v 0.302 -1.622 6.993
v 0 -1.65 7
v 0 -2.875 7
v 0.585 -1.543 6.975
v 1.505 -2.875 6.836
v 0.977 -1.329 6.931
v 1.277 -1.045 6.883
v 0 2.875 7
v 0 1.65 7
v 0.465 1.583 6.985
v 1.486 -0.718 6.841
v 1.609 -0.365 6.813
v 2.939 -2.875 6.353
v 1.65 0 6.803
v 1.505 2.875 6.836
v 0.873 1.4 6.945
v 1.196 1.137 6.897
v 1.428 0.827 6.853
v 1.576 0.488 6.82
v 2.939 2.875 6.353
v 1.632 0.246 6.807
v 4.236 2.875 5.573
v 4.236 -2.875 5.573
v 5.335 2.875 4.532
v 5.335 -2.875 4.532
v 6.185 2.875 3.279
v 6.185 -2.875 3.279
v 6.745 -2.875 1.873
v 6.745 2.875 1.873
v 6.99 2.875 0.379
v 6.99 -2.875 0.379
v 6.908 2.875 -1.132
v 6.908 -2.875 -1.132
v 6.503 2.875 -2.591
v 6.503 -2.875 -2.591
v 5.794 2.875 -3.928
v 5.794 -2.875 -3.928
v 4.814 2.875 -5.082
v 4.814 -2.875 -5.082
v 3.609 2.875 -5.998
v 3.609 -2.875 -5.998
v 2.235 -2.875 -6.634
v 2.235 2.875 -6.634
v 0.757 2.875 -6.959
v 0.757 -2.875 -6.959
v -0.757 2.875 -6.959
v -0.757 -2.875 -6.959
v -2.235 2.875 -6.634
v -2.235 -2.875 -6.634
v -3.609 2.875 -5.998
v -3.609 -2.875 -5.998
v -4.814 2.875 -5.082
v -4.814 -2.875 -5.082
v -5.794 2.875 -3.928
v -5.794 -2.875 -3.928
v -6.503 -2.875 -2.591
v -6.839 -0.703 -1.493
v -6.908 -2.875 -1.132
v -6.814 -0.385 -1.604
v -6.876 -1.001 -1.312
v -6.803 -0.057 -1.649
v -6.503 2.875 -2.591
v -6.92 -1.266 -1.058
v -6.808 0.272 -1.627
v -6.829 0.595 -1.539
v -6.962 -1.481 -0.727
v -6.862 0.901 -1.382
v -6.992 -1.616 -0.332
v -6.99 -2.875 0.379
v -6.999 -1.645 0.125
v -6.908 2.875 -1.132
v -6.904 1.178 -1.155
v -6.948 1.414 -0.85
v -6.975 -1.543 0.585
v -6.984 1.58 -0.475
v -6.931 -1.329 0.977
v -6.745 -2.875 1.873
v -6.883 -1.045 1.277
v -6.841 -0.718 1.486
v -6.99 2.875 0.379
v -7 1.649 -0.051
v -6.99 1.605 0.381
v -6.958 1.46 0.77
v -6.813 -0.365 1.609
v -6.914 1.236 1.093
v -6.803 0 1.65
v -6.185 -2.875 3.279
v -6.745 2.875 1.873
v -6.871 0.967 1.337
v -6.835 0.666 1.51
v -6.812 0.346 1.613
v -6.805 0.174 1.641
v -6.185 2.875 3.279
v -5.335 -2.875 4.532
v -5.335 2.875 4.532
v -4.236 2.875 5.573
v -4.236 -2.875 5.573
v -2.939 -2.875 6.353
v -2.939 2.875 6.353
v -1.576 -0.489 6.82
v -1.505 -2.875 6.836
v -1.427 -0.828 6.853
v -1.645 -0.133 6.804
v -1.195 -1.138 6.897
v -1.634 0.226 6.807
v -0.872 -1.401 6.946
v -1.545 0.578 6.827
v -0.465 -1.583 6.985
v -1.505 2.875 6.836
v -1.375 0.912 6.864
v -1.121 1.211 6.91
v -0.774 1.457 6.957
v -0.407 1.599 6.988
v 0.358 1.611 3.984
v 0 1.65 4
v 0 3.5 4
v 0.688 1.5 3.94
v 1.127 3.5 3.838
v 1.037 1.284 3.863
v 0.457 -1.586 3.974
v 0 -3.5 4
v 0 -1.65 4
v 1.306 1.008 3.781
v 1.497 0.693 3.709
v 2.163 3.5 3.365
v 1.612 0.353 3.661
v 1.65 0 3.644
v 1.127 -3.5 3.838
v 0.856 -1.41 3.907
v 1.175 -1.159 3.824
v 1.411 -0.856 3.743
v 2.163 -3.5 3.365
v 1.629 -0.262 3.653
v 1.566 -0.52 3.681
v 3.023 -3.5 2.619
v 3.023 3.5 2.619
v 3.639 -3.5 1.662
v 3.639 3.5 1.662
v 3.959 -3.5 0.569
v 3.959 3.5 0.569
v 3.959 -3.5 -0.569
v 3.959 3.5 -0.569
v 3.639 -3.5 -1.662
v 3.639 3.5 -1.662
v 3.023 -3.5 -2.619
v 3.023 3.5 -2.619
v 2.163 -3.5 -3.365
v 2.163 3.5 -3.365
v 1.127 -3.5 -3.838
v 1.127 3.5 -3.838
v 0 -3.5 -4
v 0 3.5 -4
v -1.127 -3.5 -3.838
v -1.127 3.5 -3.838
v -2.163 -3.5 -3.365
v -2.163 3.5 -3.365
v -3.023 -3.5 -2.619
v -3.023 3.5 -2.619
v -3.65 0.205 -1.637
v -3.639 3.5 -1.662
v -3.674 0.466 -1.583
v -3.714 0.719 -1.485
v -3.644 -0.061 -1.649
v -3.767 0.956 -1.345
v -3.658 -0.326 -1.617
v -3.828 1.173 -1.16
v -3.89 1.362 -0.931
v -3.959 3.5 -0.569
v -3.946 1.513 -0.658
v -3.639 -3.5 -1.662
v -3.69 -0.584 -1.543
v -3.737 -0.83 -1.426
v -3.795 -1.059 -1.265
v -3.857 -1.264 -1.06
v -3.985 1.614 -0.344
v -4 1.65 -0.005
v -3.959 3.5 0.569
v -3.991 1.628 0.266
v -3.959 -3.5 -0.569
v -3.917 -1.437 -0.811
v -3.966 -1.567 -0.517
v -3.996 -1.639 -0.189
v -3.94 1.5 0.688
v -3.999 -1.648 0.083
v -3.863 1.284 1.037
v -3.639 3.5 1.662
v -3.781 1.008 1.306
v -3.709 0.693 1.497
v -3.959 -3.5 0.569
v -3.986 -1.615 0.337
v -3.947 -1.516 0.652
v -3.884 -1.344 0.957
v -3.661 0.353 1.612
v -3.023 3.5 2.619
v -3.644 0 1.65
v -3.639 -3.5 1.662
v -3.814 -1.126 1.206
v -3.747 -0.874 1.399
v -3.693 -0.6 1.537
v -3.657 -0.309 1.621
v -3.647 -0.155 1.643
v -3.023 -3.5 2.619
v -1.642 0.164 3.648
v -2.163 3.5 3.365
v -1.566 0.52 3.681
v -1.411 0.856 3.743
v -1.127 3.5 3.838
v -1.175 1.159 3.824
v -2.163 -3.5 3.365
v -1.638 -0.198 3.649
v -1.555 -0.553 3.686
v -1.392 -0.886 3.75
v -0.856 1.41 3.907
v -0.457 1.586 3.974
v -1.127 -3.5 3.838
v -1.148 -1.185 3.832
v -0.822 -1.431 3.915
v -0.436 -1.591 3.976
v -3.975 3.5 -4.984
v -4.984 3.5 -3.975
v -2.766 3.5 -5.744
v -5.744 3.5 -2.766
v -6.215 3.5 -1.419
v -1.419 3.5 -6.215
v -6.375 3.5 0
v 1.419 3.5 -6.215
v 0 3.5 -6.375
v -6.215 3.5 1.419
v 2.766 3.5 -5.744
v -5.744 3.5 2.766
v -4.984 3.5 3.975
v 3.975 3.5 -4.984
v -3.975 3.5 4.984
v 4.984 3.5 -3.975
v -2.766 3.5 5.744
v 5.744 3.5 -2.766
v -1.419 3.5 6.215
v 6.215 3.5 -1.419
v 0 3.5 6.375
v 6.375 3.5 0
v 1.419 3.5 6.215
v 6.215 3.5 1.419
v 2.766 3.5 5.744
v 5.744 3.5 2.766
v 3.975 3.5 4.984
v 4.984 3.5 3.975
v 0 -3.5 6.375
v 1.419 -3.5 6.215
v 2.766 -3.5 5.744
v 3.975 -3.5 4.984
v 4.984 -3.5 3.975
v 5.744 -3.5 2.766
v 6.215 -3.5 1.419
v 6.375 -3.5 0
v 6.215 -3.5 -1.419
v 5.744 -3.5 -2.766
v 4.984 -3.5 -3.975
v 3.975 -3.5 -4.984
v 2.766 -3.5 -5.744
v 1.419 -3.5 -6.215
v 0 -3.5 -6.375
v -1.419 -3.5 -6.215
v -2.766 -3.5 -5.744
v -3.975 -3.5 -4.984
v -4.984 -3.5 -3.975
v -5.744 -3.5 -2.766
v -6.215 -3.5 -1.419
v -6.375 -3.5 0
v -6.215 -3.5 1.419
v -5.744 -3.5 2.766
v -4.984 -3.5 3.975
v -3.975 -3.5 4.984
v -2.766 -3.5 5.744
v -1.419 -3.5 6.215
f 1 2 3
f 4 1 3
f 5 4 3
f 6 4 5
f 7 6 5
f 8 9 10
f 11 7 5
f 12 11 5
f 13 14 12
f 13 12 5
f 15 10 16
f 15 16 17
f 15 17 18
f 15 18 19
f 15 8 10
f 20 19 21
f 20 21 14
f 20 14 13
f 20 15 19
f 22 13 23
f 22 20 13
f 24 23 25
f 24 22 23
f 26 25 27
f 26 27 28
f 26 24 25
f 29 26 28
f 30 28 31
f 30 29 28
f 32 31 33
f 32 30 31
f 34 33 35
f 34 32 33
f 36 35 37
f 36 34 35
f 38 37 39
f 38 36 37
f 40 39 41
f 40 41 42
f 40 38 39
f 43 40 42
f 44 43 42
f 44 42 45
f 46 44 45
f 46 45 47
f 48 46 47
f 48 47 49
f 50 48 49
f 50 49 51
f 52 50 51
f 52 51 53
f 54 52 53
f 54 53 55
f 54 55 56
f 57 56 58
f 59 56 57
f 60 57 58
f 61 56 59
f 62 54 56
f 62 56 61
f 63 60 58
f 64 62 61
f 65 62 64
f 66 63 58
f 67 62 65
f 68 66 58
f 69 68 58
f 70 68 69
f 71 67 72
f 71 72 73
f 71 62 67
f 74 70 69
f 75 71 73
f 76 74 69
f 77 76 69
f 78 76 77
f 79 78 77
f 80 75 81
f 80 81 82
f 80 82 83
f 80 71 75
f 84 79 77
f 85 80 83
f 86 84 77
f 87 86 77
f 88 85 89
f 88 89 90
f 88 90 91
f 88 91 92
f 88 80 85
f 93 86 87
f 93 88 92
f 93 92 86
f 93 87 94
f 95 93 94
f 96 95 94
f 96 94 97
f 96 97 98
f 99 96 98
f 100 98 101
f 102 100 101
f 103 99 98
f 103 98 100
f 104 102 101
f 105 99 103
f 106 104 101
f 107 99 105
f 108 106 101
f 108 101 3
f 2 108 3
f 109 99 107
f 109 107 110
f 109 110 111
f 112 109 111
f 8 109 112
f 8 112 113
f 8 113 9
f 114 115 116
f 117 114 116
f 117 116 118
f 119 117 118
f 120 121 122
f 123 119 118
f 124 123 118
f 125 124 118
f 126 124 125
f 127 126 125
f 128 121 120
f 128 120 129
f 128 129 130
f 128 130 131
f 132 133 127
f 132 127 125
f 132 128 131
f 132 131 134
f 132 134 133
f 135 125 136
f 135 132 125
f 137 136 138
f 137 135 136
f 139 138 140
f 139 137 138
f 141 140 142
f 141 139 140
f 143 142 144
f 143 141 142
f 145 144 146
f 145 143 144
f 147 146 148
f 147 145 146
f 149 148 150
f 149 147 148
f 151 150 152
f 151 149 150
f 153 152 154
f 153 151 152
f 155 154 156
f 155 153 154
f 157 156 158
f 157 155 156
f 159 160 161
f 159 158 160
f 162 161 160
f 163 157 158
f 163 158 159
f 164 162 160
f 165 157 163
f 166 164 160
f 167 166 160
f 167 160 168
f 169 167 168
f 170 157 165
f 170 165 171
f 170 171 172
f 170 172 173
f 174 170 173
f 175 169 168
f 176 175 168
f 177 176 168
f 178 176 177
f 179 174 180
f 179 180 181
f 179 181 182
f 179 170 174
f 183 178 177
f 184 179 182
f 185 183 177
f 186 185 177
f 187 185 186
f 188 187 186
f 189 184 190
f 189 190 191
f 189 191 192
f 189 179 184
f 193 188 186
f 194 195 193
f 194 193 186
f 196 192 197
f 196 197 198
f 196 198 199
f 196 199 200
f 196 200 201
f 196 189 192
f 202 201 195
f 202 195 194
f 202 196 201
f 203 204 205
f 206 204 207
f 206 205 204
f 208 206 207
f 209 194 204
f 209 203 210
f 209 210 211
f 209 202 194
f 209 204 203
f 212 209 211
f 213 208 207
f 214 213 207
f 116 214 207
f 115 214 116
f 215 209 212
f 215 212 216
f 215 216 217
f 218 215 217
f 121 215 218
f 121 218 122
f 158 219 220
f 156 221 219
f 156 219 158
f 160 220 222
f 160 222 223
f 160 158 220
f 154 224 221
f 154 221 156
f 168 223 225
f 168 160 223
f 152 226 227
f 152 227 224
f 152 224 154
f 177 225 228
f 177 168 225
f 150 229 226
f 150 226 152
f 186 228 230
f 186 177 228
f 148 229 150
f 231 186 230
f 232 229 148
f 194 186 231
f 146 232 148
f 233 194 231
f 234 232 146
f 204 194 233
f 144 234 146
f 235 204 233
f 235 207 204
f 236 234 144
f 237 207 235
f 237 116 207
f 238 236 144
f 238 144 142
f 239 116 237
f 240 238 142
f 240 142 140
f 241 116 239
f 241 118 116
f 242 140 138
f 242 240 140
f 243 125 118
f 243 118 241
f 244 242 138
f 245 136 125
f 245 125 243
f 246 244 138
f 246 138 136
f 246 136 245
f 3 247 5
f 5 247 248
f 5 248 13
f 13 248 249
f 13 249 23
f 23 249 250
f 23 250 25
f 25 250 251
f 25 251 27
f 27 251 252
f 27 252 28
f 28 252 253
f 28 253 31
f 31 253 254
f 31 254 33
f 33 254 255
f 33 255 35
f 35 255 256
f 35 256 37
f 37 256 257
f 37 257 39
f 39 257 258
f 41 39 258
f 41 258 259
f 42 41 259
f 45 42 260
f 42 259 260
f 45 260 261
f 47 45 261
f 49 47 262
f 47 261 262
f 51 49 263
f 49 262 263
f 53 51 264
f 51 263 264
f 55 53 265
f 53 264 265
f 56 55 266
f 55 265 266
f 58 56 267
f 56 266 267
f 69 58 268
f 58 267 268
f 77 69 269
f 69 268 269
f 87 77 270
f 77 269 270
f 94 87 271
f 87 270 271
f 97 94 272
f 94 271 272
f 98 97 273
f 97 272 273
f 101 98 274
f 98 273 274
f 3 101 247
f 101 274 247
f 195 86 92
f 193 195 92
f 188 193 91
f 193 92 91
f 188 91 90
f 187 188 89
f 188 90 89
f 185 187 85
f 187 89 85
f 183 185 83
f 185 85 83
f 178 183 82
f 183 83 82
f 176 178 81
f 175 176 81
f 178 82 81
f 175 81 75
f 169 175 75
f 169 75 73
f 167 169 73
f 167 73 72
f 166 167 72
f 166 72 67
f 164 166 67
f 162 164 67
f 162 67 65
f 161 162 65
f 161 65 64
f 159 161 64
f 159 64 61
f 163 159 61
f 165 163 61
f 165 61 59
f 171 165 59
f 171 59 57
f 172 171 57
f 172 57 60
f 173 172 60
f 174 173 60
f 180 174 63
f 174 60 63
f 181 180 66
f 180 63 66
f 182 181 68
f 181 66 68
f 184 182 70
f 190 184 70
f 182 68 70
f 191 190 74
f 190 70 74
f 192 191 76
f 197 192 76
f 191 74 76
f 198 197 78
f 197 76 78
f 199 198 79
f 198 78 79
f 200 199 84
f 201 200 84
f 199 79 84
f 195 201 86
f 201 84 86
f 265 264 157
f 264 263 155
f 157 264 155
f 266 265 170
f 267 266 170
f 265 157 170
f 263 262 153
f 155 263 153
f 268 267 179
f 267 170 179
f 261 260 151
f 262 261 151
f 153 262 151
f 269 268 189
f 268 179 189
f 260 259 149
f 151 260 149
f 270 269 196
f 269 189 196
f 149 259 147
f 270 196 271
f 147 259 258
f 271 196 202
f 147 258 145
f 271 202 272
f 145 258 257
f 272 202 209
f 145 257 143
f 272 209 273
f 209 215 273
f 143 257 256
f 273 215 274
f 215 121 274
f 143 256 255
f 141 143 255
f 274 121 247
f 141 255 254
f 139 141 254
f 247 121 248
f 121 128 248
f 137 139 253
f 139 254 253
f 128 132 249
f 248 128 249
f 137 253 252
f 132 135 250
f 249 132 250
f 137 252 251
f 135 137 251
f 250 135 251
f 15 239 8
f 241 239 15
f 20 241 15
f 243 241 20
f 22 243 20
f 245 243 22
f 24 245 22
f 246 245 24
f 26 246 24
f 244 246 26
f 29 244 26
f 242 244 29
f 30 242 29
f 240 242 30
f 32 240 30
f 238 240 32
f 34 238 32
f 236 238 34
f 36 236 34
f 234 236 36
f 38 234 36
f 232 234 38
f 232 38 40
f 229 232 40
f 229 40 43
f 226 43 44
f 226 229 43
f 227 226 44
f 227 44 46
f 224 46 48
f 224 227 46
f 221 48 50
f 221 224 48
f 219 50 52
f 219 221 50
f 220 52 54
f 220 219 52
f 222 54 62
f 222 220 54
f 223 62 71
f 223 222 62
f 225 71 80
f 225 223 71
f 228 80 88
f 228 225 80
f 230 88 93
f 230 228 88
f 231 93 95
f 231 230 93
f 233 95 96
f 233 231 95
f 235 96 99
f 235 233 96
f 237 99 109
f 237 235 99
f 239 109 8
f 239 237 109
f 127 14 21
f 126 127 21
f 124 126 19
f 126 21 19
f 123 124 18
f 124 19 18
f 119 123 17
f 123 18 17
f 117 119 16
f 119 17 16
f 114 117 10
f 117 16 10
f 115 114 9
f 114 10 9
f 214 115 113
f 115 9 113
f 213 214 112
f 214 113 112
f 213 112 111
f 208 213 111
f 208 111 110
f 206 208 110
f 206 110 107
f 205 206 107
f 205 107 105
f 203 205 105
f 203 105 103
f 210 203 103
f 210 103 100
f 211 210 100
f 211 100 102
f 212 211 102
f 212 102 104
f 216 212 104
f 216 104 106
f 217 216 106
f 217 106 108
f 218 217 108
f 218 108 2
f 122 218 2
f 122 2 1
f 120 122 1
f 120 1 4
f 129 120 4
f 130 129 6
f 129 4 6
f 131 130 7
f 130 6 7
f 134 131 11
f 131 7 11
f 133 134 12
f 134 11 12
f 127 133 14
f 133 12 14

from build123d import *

# Parameters (mm, degrees)
SKETCH1_R                  = 7
SKETCH1_R_2                = 4
BOSS_EXTRUDE1_DEPTH        = 3.5
M4X0_7_TAPPED_HOLE1_REACH  = 18.039
M4X0_7_TAPPED_HOLE1_BORE_R = 1.65
CHAMFER1_SIZE              = 0.625
CIRPATTERN1_COUNT          = 2
CIRPATTERN1_ANGLE          = 90


with BuildPart() as part:
    # Sketch1 → Boss-Extrude1 (new, symmetric)
    with BuildSketch(Plane(origin=(0, 0, 0), x_dir=(1, 0, 0), z_dir=(0, 1, 0))):
        with Locations(Location((0, 0, 0), (0, 0, 270))):
            Circle(SKETCH1_R)
        with Locations(Location((0, 0, 0), (0, 0, 270))):
            Circle(SKETCH1_R_2, mode=Mode.SUBTRACT)
    extrude(amount=BOSS_EXTRUDE1_DEPTH, both=True)

    # M4x0.7 Tapped Hole1 bore → M4x0.7 Tapped Hole1 (cut, up to next)
    with BuildSketch(Plane.XY.offset(7), mode=Mode.PRIVATE) as m4x0_7_tapped_hole1_sk1:
        Circle(M4X0_7_TAPPED_HOLE1_BORE_R)
    m4x0_7_tapped_hole1_tool1 = extrude(m4x0_7_tapped_hole1_sk1.sketch, amount=-M4X0_7_TAPPED_HOLE1_REACH, mode=Mode.PRIVATE) & part.part
    m4x0_7_tapped_hole1 = m4x0_7_tapped_hole1_tool1.solids().sort_by_distance((0, 0, 7))[0]
    add(m4x0_7_tapped_hole1, mode=Mode.SUBTRACT)

    # Chamfer1
    chamfer1_edges = [part.edges().sort_by_distance(p)[0] for p in [
        (0, -3.5, -7),
        (0, 3.5, -7),
    ]]
    chamfer(chamfer1_edges, length=CHAMFER1_SIZE)

    # CirPattern1: M4x0.7 Tapped Hole1 ×2 about axis
    cirpattern1_axis = Axis((0, 3.5, 0), (0, -1, 0))
    for i in range(1, CIRPATTERN1_COUNT):
        add(m4x0_7_tapped_hole1.rotate(cirpattern1_axis, i * CIRPATTERN1_ANGLE / (CIRPATTERN1_COUNT - 1)), mode=Mode.SUBTRACT)


solid = part.part
